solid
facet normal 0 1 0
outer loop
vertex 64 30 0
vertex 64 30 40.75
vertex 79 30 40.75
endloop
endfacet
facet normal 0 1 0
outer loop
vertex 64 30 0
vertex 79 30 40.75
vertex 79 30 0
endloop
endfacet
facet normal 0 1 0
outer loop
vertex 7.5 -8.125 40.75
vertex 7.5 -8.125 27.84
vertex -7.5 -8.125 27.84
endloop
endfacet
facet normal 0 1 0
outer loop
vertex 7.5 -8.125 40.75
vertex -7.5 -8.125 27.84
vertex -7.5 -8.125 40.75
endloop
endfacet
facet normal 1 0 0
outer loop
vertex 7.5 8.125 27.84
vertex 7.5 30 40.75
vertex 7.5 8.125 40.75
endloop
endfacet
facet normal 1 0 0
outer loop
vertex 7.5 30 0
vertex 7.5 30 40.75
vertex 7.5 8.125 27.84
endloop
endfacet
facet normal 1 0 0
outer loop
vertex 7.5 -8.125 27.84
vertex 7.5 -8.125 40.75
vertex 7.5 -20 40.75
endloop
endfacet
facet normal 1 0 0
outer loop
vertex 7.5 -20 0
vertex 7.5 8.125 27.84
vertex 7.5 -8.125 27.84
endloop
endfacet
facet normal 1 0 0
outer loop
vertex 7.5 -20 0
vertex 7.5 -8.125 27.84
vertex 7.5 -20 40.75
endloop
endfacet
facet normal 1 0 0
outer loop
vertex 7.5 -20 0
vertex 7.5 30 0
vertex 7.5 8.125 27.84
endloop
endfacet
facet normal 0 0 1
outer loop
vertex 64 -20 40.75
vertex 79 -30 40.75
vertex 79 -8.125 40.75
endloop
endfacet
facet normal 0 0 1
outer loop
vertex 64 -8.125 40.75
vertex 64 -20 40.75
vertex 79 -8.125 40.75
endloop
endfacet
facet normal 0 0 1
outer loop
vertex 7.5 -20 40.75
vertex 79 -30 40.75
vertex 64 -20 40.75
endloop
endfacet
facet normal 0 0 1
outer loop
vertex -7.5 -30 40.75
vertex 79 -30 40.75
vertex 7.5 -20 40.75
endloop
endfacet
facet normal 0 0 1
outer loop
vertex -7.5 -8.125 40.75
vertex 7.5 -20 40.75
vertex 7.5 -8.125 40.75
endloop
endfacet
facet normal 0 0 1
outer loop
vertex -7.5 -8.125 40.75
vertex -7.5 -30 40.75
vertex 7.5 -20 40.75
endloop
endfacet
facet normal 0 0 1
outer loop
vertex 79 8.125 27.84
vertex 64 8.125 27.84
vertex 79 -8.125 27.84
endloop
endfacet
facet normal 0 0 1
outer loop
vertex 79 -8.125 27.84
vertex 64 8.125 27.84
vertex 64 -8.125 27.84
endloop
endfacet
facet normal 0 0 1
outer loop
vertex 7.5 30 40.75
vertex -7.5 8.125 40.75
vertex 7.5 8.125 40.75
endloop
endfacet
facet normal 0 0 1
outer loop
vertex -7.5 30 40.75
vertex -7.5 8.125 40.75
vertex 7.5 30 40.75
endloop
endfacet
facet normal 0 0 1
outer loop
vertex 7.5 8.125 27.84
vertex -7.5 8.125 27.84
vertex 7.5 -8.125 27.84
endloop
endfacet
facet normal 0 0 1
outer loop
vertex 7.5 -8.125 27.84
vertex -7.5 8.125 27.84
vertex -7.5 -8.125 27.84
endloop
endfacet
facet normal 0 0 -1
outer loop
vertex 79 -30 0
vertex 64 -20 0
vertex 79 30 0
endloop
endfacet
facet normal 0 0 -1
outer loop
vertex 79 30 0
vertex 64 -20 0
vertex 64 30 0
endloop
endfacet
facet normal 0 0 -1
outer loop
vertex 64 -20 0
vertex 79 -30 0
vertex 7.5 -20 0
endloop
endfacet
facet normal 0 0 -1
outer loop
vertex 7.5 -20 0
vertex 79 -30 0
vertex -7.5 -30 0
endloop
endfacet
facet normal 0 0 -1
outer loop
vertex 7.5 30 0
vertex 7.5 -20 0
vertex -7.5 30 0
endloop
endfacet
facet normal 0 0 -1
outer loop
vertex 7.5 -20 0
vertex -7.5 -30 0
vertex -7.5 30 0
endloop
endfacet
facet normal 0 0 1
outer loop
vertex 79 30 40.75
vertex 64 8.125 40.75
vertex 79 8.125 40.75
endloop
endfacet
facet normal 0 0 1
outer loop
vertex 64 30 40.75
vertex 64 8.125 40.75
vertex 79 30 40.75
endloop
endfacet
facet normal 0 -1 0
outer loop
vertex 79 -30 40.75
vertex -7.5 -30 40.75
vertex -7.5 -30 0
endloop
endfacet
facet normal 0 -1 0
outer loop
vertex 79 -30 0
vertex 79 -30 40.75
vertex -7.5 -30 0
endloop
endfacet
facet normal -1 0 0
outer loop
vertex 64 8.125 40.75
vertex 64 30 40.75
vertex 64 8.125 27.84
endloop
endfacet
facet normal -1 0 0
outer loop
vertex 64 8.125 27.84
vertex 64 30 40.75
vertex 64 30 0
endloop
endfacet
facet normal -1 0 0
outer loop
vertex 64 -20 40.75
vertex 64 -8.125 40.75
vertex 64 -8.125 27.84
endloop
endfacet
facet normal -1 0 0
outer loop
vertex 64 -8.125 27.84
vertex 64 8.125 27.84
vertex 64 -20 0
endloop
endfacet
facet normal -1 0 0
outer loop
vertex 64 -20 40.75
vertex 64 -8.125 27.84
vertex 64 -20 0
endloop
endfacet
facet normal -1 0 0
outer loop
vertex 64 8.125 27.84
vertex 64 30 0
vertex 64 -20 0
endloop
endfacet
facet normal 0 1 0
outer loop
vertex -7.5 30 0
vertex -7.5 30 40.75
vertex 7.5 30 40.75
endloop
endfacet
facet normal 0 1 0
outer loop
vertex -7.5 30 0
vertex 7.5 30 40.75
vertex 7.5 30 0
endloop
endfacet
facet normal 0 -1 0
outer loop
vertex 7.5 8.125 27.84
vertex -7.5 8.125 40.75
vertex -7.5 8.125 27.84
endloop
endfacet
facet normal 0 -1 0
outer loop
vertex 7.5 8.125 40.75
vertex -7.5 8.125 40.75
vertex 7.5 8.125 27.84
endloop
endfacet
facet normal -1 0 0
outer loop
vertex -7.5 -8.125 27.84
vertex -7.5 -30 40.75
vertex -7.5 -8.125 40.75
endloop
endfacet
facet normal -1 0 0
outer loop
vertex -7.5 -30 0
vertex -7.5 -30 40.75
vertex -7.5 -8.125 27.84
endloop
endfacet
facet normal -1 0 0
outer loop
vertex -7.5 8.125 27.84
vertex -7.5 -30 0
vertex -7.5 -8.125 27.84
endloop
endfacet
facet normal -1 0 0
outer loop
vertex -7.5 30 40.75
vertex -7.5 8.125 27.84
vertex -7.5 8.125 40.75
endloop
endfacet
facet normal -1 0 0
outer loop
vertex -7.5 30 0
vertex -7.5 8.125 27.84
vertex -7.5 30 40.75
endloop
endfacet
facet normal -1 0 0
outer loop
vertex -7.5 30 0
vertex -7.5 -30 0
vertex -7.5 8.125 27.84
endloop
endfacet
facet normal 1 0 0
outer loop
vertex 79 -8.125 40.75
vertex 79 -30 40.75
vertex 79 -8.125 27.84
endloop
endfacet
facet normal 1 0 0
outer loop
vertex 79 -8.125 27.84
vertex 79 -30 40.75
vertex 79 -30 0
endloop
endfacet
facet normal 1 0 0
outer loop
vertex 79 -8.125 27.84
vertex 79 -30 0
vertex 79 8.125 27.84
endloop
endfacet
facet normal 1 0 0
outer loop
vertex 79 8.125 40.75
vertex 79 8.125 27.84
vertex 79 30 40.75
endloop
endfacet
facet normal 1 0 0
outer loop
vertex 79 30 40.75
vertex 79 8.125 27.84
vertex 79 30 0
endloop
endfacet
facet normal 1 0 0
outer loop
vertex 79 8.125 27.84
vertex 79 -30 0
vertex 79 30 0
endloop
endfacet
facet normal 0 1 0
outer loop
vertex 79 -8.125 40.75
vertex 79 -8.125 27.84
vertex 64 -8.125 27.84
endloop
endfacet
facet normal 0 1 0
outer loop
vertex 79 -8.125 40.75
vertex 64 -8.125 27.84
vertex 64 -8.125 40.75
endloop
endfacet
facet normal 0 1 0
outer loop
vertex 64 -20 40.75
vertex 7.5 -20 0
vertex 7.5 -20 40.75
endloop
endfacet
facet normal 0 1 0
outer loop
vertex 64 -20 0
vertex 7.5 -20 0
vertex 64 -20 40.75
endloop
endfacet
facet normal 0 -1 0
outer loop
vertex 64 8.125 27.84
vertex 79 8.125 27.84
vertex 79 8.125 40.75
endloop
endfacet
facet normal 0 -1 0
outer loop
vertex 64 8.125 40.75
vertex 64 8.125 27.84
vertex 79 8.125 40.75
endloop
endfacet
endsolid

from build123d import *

# Parameters (mm, degrees)
F0_W     = 15
F0_H     = 60
F1_DEPTH = 28.5
F3_W     = 56.5
F3_H     = 50
F4_DEPTH = 28.501
F2_W     = 15
F2_H     = 21.875
F5_DEPTH = 12.25
F6_DEPTH = 71.5
F7_DEPTH = 40.751
F8_DEPTH = 0.66


with BuildPart() as f1:
    # F0 (on Top) → F1 (new body)
    with BuildSketch(Plane.XY):
        Rectangle(F0_W, F0_H)
    extrude(amount=F1_DEPTH)

    # F3 (on face) → F4 (cut, through all)
    with BuildSketch(Plane(origin=(0, 0, 0), x_dir=(1, 0, 0), z_dir=(0, 0, -1))):
        with Locations((35.75, -5)):
            Rectangle(F3_W, F3_H)
    extrude(amount=-F4_DEPTH, mode=Mode.SUBTRACT)

    # F2 (on face) → F5 (join)
    with BuildSketch(Plane.XY.offset(28.5)):
        with Locations((0, 19.0625)):
            Rectangle(F2_W, F2_H)
        with Locations((0, -19.0625)):
            Rectangle(F2_W, F2_H)
    extrude(amount=F5_DEPTH)

    # F6 (add): a face of the model
    f6_faces = [f1.faces().sort_by_distance(p)[0] for p in [
        (7.5, 0, 19.1119903993),
    ]]
    extrude(f6_faces, amount=F6_DEPTH)

    # F3 (on face) → F7 (cut, through all)
    with BuildSketch(Plane(origin=(0, 0, 0), x_dir=(1, 0, 0), z_dir=(0, 0, -1))):
        with Locations((35.75, -5)):
            Rectangle(F3_W, F3_H)
    extrude(amount=-F7_DEPTH, mode=Mode.SUBTRACT)

    # F8 (cut): faces of the model
    f8_faces = [f1.faces().sort_by_distance(p)[0] for p in [
        (0, 0, 28.5),
        (71.5, 0, 28.5),
    ]]
    extrude(f8_faces, amount=-F8_DEPTH, mode=Mode.SUBTRACT)


solid = f1.part
